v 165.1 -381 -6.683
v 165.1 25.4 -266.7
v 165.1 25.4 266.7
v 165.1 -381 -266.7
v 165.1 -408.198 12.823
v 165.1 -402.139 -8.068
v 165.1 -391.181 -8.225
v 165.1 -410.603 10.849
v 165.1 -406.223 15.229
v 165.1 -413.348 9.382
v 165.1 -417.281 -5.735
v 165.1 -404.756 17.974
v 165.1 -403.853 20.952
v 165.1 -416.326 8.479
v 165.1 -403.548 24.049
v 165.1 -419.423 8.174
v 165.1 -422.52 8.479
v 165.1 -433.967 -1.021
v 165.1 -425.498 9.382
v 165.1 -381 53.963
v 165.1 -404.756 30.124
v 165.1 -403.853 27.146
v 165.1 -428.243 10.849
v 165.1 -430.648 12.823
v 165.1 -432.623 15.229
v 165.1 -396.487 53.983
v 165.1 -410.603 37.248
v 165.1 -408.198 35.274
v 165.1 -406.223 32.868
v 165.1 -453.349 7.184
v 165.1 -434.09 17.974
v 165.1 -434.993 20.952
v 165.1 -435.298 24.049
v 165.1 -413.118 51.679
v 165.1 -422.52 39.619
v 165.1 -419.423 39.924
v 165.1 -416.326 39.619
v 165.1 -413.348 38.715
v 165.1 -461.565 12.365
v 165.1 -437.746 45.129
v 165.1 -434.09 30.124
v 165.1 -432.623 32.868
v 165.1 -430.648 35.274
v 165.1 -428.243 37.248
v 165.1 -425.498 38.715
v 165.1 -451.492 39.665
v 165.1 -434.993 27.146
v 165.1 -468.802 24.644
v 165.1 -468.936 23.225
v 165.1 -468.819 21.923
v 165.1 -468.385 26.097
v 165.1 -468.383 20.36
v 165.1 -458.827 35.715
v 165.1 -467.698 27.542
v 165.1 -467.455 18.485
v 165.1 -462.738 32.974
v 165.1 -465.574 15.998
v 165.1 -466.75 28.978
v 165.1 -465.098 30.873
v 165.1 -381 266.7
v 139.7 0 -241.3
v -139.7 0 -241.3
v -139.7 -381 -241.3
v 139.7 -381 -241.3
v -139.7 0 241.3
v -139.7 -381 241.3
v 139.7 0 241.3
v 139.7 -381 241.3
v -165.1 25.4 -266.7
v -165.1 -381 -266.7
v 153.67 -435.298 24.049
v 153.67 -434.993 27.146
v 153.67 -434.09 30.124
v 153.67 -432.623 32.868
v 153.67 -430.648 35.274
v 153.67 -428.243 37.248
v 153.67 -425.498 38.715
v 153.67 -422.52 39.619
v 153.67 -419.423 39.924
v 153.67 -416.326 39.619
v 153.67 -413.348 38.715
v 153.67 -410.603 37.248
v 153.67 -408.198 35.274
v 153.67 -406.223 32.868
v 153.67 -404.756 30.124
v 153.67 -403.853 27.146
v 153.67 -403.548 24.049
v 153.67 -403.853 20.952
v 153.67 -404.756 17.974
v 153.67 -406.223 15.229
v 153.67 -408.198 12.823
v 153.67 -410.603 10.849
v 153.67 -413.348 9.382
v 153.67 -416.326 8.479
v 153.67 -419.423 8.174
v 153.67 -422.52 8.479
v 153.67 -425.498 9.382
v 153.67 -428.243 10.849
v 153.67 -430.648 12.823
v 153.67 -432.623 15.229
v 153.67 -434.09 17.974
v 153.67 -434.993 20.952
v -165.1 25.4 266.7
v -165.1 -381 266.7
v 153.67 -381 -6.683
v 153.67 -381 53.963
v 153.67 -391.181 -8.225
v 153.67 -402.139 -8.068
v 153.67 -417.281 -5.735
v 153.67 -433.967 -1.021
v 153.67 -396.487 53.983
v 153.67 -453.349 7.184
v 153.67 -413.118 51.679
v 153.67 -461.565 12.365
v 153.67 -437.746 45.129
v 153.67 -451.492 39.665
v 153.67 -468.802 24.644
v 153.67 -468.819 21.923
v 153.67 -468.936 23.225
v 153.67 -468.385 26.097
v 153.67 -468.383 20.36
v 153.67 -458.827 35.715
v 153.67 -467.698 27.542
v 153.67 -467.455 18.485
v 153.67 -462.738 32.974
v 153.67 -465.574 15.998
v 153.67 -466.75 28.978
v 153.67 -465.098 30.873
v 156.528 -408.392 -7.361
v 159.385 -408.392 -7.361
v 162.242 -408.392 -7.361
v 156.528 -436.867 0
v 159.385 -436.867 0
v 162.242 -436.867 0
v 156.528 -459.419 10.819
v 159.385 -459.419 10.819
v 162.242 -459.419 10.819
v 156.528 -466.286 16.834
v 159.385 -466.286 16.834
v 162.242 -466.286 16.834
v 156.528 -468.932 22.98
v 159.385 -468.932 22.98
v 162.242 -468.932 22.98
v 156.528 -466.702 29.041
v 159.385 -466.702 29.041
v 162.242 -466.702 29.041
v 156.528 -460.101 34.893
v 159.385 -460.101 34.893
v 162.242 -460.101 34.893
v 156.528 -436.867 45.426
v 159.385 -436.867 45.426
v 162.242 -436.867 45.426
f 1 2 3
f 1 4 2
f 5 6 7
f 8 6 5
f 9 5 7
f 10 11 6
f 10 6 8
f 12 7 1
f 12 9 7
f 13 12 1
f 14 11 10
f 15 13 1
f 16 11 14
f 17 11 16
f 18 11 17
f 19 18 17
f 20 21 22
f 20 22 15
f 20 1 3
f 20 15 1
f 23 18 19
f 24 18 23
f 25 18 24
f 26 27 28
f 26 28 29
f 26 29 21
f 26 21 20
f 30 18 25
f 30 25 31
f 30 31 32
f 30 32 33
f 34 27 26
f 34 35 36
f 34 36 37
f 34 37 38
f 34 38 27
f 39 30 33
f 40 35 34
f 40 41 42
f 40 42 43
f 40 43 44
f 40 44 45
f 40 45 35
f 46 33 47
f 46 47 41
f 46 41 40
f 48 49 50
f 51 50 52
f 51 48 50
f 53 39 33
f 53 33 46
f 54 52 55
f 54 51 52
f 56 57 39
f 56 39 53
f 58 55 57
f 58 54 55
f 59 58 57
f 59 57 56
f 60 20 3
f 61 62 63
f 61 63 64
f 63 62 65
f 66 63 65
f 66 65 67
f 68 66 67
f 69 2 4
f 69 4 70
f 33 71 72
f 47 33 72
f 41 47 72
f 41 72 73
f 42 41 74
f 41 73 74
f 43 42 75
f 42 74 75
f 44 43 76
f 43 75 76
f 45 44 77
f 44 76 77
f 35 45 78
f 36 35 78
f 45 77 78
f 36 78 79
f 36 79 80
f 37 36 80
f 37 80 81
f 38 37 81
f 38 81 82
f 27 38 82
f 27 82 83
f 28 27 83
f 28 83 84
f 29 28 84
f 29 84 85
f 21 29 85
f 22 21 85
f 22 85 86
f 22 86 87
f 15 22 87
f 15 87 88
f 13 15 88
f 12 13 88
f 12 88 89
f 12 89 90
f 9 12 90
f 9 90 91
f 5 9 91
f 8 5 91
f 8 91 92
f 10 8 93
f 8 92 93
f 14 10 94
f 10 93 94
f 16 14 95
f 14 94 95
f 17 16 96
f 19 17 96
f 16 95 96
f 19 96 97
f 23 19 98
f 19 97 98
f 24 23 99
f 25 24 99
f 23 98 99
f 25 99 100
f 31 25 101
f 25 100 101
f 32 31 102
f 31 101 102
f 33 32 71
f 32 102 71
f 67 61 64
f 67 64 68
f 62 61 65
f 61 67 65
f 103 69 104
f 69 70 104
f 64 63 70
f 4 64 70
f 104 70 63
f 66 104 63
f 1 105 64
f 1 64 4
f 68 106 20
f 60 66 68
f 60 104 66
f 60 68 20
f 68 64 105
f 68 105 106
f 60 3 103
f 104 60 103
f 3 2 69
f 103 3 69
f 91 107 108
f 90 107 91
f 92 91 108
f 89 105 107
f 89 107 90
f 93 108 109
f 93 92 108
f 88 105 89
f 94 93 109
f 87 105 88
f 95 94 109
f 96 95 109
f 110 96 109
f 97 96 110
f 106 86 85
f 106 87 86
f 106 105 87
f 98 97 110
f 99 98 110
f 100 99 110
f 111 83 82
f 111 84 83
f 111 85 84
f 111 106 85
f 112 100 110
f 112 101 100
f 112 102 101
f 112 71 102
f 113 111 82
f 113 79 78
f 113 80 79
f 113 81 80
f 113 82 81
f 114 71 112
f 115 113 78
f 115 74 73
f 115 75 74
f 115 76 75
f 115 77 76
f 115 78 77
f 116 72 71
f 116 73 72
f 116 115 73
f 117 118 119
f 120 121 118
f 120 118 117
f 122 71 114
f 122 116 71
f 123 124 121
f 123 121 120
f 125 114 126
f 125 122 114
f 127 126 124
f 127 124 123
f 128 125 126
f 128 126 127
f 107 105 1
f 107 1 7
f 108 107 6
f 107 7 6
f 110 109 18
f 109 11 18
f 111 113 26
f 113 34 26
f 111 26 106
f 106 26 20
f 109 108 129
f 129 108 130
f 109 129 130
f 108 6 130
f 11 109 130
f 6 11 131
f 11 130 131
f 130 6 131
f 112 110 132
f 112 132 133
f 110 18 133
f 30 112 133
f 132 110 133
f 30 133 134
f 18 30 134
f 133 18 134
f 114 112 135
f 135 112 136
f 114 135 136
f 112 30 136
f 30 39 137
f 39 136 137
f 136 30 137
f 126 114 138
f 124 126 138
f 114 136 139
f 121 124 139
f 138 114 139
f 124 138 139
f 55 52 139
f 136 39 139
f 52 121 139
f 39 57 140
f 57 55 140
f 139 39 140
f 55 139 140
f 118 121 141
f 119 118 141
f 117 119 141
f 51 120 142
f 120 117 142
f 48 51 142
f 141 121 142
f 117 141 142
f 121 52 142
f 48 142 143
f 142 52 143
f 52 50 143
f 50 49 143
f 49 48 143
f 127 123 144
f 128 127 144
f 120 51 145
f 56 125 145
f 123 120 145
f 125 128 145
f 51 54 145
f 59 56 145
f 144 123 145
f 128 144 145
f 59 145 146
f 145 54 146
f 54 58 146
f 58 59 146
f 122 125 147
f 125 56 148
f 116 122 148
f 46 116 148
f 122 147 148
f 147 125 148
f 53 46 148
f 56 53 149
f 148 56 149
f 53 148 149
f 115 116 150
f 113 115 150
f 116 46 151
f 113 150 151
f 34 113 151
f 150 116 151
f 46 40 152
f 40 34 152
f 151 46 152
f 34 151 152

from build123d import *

# Parameters (mm, degrees)
F0_W     = 330.2
F0_H     = 533.4
F0_W_2   = 279.4
F0_H_2   = 482.6
F1_DEPTH = 381
F3_DEPTH = 11.43
F5_D     = 31.75
F6_W     = 330.2
F6_H     = 533.4
F7_DEPTH = 25.4


with BuildPart() as f1:
    # F0 (on Front) → F1 (new body)
    with BuildSketch(Plane.XZ):
        Rectangle(F0_W, F0_H)
        Rectangle(F0_W_2, F0_H_2, mode=Mode.SUBTRACT)
    extrude(amount=F1_DEPTH)

    # F2 (on face) → F3 (join)
    with BuildSketch(Plane.YZ.offset(165.1)):
        with BuildLine():
            add(Edge.make_bspline(
                [(-381, -6.6830463366), (-397.4427610563, -10.9233558088), (-440.2612759163, -2.0870202582), (-482.6984064218, 23.1422229449), (-443.5296874883, 46.3759759497), (-397.7583791554, 55.5903688255), (-381, 53.9625514371)],
                knots=[0.054305568, 0.054305568, 0.054305568, 0.054305568, 0.2287997299, 0.4012099815, 0.5729439025, 0.7296806034, 0.7296806034, 0.7296806034, 0.7296806034], degree=3))
            Line((-381, -6.6830463366), (-381, 53.9625514371))
        make_face()
        with BuildLine():
            add(Edge.make_bspline(
                [(-367.3923313618, 0), (-371.2589549432, -3.2025358081), (-375.8827314956, -5.3633894957), (-381, -6.6830463366)],
                knots=[0, 0, 0, 0, 0.054305568, 0.054305568, 0.054305568, 0.054305568], degree=3))
            add(Edge.make_bspline(
                [(-381, 53.9625514371), (-372.0113951219, 53.0894474703), (-347.8101498957, 44.708864678), (-354.1310052856, 10.9837098771), (-367.3923313618, 0)],
                knots=[0.7296806034, 0.7296806034, 0.7296806034, 0.7296806034, 0.8137486544, 1, 1, 1, 1], degree=3))
            Line((-381, 53.9625514371), (-381, -6.6830463366))
        make_face()
    extrude(amount=-F3_DEPTH)

    # F5 (through all)
    with Locations(Plane.YZ.offset(165.1)):
        with Locations((-419.4230139256, 24.0488089621)):
            Hole(F5_D / 2)

    # F6 (on face) → F7 (join)
    with BuildSketch(Plane(origin=(0, 0, 0), x_dir=(-1, 0, 0), z_dir=(0, 1, 0))):
        Rectangle(F6_W, F6_H)
    extrude(amount=F7_DEPTH)


solid = f1.part
